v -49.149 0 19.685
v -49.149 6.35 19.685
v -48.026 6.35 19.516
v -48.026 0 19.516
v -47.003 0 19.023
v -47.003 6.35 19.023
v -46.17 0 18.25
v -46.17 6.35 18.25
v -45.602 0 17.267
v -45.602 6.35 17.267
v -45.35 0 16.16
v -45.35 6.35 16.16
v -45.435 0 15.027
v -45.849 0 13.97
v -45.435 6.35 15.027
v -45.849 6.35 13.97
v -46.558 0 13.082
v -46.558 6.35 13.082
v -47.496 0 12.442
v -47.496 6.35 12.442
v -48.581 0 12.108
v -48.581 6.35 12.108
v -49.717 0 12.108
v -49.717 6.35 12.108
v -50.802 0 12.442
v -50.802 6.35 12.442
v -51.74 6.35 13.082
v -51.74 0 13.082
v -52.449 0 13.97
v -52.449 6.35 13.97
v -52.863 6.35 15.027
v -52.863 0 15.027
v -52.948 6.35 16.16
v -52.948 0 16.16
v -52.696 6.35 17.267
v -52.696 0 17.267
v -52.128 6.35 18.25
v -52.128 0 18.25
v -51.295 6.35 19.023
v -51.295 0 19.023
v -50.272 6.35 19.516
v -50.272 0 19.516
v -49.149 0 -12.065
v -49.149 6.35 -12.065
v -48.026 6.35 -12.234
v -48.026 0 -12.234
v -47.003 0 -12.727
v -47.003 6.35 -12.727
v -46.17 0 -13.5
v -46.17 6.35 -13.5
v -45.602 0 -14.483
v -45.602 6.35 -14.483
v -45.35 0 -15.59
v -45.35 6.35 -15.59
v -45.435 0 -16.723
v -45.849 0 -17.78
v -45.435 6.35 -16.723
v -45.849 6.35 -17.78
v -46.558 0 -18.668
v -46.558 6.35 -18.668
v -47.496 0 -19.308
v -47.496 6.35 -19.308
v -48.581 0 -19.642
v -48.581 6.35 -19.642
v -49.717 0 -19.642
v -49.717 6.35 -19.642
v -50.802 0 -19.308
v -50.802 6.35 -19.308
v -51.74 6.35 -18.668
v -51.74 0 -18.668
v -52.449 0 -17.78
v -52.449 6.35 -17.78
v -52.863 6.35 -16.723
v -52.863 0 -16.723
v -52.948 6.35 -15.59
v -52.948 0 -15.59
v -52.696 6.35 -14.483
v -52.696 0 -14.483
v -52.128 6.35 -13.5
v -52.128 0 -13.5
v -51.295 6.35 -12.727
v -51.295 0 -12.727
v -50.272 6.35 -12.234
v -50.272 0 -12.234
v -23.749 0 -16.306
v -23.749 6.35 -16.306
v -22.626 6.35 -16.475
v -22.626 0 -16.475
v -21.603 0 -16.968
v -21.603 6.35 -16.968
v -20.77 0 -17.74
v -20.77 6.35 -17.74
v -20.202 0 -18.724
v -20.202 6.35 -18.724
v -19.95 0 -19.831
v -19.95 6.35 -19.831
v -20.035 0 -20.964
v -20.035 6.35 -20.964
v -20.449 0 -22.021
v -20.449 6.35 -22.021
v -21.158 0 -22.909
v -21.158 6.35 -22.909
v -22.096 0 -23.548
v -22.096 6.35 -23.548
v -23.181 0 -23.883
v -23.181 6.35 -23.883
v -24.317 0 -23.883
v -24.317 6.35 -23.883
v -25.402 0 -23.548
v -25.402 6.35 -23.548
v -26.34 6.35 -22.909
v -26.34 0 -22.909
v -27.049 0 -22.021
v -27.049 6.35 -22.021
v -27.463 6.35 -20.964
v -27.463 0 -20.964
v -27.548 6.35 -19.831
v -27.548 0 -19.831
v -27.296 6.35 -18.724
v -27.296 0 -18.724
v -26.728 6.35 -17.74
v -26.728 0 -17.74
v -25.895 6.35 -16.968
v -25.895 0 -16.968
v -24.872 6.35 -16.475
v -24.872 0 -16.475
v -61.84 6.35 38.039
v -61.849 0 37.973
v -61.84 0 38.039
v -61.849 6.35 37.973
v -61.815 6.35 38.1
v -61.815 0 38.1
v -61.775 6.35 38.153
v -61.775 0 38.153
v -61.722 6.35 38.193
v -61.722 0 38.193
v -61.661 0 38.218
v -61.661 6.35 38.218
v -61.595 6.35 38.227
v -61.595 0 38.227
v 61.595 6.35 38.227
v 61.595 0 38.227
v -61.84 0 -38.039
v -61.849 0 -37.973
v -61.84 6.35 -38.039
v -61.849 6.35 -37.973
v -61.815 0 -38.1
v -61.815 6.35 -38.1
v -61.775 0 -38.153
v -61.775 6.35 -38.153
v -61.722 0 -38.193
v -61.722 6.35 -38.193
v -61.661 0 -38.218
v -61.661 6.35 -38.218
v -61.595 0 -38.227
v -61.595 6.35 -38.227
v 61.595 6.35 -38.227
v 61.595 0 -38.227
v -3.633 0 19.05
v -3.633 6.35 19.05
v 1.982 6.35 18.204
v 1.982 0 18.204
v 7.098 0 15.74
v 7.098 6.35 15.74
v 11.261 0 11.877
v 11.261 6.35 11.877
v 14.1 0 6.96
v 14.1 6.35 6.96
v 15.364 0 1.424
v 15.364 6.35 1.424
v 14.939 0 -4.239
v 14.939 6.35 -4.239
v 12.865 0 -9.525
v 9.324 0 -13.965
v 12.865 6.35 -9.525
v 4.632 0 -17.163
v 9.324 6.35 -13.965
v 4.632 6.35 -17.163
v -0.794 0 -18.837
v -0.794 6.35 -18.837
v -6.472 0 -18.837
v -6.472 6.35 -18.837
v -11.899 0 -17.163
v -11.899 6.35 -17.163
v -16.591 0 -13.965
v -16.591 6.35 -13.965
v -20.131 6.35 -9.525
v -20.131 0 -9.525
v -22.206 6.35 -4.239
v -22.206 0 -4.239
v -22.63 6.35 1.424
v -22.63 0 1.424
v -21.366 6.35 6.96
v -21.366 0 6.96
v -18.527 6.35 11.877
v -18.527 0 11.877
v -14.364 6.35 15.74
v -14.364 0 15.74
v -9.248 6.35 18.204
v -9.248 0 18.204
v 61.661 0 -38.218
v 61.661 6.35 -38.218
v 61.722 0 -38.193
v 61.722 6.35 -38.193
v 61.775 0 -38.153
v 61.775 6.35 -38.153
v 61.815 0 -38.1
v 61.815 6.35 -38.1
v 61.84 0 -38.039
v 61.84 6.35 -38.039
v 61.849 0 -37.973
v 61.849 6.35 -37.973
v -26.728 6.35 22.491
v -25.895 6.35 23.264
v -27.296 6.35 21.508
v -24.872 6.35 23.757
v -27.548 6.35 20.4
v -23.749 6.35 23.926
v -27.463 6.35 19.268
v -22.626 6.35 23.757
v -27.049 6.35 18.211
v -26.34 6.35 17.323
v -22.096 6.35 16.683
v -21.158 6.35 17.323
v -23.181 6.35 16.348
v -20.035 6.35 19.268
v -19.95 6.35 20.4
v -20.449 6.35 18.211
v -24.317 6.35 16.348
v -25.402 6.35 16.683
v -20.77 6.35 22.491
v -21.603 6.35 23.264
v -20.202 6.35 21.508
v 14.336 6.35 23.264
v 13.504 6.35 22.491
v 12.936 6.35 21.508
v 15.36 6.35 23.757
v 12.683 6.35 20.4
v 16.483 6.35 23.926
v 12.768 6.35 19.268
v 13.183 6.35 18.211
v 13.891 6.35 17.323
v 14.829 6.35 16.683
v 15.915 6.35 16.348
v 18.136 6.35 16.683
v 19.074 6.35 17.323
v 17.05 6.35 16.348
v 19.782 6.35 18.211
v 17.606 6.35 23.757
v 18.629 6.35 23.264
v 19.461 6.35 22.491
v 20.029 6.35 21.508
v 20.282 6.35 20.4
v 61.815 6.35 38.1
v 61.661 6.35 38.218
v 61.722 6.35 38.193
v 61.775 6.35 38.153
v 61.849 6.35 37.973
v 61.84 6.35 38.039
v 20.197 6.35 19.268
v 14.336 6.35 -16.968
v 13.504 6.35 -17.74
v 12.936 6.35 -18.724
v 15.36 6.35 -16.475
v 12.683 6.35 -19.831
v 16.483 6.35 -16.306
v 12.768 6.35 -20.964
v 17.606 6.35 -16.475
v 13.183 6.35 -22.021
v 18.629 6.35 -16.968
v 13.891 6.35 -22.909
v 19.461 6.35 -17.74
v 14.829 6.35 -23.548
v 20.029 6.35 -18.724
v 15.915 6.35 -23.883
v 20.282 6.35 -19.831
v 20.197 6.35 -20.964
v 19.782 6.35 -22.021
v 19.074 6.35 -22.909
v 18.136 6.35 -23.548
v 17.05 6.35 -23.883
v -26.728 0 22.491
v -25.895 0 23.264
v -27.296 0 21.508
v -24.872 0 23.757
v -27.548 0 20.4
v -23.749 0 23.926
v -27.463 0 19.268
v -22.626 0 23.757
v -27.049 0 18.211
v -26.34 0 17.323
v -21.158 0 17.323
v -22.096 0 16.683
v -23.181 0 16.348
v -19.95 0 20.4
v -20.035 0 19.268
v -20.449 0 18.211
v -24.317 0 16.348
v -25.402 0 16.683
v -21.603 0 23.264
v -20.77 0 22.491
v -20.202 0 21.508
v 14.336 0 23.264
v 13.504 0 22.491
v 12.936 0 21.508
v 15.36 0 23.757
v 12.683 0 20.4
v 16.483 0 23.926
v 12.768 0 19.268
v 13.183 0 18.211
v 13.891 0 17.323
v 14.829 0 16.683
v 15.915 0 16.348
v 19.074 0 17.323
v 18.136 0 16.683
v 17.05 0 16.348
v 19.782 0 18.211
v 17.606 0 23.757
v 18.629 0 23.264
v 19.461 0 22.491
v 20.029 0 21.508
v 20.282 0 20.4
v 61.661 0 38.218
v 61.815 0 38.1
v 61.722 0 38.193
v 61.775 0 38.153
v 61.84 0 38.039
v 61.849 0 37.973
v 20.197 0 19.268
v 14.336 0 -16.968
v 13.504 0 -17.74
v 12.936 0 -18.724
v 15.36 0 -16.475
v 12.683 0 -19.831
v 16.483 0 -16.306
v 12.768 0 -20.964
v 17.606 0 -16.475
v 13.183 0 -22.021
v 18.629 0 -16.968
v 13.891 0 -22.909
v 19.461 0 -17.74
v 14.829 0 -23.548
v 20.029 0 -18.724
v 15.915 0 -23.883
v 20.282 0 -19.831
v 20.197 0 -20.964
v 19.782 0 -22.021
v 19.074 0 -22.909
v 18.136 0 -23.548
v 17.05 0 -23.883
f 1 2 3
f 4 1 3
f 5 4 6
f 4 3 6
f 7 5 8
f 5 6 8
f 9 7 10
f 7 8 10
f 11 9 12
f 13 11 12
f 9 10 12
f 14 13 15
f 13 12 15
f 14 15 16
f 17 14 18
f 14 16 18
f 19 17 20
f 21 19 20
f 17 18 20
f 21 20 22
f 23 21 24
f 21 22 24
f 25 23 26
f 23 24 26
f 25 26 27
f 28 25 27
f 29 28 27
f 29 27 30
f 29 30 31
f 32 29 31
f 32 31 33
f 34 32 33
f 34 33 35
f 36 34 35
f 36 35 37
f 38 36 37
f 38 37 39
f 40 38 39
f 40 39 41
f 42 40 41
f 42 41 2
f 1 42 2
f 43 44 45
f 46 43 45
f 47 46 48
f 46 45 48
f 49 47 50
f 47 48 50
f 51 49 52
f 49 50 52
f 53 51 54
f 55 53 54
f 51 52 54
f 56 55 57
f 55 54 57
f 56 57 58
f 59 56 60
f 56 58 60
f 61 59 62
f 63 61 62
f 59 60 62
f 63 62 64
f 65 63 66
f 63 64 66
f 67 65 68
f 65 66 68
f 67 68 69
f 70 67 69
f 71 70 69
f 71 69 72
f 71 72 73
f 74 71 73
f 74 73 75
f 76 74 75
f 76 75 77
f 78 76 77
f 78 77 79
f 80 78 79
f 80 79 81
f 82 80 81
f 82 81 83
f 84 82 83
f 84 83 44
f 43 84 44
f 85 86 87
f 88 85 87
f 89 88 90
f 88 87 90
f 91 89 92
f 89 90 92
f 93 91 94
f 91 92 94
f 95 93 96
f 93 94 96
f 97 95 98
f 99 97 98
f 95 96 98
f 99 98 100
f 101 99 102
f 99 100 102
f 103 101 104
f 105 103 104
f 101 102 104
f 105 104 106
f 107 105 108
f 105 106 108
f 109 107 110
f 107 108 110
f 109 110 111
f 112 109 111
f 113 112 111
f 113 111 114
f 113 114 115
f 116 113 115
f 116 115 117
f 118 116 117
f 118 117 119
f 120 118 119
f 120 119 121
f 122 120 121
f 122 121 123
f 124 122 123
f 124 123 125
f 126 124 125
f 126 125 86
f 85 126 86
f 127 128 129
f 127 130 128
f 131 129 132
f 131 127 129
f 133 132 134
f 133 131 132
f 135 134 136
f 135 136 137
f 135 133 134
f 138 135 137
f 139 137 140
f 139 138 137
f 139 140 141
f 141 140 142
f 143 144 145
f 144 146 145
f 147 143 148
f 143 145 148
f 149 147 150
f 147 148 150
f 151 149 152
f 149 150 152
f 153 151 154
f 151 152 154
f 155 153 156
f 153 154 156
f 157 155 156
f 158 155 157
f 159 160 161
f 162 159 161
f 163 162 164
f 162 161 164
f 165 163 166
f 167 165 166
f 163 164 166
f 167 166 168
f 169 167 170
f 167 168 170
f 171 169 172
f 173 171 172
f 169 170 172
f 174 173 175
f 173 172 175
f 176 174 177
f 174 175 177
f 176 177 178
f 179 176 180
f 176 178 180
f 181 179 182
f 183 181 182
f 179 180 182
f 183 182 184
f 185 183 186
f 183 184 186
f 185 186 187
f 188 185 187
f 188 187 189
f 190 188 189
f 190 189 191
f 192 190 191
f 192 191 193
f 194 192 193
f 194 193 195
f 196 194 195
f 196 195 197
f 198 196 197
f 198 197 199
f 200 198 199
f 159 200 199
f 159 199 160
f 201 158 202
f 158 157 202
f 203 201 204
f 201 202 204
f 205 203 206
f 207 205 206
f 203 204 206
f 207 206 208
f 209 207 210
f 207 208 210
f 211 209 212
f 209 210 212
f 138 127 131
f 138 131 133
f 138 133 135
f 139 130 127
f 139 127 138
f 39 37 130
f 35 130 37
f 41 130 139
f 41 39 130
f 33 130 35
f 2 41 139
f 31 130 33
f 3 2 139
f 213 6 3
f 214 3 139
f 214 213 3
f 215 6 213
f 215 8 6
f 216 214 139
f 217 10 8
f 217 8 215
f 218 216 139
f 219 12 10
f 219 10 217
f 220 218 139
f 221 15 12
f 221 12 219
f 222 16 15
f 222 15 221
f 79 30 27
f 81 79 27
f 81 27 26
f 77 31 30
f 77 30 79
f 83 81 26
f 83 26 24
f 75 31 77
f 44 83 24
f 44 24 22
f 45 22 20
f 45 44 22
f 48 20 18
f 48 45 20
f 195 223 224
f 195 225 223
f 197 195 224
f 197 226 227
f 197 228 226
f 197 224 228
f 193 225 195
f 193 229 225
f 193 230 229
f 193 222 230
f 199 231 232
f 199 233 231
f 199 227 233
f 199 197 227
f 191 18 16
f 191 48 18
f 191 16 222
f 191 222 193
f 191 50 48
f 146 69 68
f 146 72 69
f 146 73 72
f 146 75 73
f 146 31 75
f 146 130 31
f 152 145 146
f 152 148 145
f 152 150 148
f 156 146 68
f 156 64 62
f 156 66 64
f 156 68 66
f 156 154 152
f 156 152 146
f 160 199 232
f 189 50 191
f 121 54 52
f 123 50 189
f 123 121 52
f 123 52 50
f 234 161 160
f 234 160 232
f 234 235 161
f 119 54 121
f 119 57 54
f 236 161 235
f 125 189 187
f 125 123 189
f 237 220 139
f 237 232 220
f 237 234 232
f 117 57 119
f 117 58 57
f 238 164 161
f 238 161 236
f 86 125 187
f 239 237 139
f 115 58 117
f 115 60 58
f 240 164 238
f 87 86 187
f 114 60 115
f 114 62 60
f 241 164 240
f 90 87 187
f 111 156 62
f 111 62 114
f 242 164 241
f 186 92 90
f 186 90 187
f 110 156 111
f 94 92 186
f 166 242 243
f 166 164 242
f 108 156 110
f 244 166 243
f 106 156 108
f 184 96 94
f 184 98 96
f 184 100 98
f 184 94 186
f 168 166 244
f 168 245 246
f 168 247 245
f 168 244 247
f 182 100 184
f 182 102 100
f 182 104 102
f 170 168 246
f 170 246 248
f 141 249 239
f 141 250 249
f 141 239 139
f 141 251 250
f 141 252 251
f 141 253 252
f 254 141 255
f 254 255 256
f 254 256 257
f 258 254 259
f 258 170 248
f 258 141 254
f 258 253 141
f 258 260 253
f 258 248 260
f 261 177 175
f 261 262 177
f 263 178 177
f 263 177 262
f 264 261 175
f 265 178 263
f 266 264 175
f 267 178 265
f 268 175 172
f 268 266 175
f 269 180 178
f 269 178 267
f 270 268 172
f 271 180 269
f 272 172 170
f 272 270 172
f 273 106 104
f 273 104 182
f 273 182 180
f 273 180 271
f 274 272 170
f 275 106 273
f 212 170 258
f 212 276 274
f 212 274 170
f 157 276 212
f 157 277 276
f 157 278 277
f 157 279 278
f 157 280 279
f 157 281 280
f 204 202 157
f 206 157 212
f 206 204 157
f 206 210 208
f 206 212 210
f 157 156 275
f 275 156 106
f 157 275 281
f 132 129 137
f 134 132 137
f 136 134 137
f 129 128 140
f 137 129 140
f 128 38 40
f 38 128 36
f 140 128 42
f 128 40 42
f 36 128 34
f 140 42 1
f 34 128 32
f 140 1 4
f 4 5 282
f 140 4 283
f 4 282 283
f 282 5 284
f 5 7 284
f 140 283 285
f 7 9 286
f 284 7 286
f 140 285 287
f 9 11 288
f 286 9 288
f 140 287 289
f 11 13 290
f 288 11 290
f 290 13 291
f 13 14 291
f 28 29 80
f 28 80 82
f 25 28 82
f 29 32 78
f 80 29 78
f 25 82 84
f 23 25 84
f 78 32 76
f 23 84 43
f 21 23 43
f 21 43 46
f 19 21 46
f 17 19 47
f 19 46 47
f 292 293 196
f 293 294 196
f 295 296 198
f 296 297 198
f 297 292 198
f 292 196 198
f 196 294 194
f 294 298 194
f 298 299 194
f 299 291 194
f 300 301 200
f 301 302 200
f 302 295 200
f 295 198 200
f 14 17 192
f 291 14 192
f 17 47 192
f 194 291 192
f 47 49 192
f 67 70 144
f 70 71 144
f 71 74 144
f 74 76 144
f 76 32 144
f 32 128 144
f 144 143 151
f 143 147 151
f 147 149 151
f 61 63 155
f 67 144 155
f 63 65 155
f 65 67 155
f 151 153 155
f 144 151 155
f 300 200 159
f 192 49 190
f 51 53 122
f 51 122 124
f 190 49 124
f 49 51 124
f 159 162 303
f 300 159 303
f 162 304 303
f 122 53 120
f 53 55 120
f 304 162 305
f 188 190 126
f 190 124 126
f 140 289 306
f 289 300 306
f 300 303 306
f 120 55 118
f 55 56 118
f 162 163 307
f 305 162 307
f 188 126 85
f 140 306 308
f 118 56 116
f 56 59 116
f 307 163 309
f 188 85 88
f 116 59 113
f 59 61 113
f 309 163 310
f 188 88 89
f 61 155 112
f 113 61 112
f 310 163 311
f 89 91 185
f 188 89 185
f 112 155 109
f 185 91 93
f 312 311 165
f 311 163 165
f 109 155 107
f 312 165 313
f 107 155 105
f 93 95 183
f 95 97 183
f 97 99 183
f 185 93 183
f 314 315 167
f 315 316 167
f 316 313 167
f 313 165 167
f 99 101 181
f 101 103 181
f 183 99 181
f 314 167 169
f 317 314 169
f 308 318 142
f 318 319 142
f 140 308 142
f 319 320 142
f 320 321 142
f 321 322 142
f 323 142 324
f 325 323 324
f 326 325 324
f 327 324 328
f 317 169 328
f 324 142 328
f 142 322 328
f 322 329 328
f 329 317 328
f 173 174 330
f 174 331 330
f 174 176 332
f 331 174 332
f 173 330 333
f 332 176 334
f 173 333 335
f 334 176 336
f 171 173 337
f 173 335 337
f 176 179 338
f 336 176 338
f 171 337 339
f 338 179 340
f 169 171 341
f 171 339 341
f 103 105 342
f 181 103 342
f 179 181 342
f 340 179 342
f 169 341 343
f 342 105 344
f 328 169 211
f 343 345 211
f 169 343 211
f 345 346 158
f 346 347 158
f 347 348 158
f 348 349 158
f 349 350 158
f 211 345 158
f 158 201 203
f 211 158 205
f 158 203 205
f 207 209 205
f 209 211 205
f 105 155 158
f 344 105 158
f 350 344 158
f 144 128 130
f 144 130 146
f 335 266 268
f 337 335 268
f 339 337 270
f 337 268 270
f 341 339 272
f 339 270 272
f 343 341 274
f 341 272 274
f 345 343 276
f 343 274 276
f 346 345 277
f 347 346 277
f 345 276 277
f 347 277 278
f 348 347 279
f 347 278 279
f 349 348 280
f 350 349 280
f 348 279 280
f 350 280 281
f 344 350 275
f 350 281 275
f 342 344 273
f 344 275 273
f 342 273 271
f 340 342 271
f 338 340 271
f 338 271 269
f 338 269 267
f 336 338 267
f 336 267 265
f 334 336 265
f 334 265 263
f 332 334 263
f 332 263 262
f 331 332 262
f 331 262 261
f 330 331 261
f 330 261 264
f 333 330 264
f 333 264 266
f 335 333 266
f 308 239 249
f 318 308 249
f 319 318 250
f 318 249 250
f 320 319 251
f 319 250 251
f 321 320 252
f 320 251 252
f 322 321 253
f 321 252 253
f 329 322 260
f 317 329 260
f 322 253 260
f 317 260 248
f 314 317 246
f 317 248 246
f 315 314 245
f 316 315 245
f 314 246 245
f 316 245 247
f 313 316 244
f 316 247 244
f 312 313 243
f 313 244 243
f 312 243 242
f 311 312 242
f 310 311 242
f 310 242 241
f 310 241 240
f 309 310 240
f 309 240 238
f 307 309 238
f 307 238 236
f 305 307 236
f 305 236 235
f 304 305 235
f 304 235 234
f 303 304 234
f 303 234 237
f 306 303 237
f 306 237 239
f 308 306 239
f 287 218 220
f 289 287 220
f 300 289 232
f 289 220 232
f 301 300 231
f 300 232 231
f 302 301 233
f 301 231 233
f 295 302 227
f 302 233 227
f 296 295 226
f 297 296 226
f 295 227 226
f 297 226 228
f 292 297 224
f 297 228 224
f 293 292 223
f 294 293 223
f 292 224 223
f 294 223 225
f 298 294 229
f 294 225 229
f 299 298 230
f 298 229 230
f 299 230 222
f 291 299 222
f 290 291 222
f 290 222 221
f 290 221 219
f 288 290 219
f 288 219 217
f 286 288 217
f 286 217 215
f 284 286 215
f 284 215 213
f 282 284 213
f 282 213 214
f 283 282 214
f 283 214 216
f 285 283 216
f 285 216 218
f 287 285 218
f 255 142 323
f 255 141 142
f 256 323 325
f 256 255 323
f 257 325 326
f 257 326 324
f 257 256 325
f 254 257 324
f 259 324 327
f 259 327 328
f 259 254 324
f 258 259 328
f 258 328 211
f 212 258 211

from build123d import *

# Parameters (mm, degrees)
SKETCH1_W           = 123.698
SKETCH1_H           = 76.454
BOSS_EXTRUDE1_DEPTH = 6.35
SKETCH6_R           = 19.05
SKETCH6_R_2         = 3.81
CUT_EXTRUDE5_DEPTH  = 73.985785123
FILLET1_R           = 0.254


with BuildPart() as part:
    # Sketch1 → Boss-Extrude1 (new body)
    with BuildSketch(Plane(origin=(0, 0, 0), x_dir=(1, 0, 0), z_dir=(0, 1, 0))):
        Rectangle(SKETCH1_W, SKETCH1_H)
    extrude(amount=BOSS_EXTRUDE1_DEPTH)

    # Sketch6 → Cut-Extrude5 (cut, through all)
    with BuildSketch(Plane(origin=(0, 6.35, 0), x_dir=(1, 0, 0), z_dir=(0, 1, 0))):
        with Locations(Location((-3.633226289, 0, 0), (0, 0, 270))):
            Circle(SKETCH6_R)
        with Locations(Location((16.482547422, 20.115773711, 0), (0, 0, 270))):
            Circle(SKETCH6_R_2)
        with Locations(Location((-23.749, 20.115773711, 0), (0, 0, 270))):
            Circle(SKETCH6_R_2)
        with Locations(Location((-23.749, -20.115773711, 0), (0, 0, 270))):
            Circle(SKETCH6_R_2)
        with Locations(Location((16.482547422, -20.115773711, 0), (0, 0, 270))):
            Circle(SKETCH6_R_2)
        with Locations(Location((-49.149, 15.875, 0), (0, 0, 270))):
            Circle(SKETCH6_R_2)
        with Locations(Location((-49.149, -15.875, 0), (0, 0, 270))):
            Circle(SKETCH6_R_2)
    extrude(amount=-CUT_EXTRUDE5_DEPTH, mode=Mode.SUBTRACT)

    # Fillet1
    fillet1_edges = [part.edges().sort_by_distance(p)[0] for p in [
        (61.849, 3.175, 38.227),
        (-61.849, 3.175, 38.227),
        (-61.849, 3.175, -38.227),
        (61.849, 3.175, -38.227),
    ]]
    fillet(fillet1_edges, radius=FILLET1_R)


solid = part.part
